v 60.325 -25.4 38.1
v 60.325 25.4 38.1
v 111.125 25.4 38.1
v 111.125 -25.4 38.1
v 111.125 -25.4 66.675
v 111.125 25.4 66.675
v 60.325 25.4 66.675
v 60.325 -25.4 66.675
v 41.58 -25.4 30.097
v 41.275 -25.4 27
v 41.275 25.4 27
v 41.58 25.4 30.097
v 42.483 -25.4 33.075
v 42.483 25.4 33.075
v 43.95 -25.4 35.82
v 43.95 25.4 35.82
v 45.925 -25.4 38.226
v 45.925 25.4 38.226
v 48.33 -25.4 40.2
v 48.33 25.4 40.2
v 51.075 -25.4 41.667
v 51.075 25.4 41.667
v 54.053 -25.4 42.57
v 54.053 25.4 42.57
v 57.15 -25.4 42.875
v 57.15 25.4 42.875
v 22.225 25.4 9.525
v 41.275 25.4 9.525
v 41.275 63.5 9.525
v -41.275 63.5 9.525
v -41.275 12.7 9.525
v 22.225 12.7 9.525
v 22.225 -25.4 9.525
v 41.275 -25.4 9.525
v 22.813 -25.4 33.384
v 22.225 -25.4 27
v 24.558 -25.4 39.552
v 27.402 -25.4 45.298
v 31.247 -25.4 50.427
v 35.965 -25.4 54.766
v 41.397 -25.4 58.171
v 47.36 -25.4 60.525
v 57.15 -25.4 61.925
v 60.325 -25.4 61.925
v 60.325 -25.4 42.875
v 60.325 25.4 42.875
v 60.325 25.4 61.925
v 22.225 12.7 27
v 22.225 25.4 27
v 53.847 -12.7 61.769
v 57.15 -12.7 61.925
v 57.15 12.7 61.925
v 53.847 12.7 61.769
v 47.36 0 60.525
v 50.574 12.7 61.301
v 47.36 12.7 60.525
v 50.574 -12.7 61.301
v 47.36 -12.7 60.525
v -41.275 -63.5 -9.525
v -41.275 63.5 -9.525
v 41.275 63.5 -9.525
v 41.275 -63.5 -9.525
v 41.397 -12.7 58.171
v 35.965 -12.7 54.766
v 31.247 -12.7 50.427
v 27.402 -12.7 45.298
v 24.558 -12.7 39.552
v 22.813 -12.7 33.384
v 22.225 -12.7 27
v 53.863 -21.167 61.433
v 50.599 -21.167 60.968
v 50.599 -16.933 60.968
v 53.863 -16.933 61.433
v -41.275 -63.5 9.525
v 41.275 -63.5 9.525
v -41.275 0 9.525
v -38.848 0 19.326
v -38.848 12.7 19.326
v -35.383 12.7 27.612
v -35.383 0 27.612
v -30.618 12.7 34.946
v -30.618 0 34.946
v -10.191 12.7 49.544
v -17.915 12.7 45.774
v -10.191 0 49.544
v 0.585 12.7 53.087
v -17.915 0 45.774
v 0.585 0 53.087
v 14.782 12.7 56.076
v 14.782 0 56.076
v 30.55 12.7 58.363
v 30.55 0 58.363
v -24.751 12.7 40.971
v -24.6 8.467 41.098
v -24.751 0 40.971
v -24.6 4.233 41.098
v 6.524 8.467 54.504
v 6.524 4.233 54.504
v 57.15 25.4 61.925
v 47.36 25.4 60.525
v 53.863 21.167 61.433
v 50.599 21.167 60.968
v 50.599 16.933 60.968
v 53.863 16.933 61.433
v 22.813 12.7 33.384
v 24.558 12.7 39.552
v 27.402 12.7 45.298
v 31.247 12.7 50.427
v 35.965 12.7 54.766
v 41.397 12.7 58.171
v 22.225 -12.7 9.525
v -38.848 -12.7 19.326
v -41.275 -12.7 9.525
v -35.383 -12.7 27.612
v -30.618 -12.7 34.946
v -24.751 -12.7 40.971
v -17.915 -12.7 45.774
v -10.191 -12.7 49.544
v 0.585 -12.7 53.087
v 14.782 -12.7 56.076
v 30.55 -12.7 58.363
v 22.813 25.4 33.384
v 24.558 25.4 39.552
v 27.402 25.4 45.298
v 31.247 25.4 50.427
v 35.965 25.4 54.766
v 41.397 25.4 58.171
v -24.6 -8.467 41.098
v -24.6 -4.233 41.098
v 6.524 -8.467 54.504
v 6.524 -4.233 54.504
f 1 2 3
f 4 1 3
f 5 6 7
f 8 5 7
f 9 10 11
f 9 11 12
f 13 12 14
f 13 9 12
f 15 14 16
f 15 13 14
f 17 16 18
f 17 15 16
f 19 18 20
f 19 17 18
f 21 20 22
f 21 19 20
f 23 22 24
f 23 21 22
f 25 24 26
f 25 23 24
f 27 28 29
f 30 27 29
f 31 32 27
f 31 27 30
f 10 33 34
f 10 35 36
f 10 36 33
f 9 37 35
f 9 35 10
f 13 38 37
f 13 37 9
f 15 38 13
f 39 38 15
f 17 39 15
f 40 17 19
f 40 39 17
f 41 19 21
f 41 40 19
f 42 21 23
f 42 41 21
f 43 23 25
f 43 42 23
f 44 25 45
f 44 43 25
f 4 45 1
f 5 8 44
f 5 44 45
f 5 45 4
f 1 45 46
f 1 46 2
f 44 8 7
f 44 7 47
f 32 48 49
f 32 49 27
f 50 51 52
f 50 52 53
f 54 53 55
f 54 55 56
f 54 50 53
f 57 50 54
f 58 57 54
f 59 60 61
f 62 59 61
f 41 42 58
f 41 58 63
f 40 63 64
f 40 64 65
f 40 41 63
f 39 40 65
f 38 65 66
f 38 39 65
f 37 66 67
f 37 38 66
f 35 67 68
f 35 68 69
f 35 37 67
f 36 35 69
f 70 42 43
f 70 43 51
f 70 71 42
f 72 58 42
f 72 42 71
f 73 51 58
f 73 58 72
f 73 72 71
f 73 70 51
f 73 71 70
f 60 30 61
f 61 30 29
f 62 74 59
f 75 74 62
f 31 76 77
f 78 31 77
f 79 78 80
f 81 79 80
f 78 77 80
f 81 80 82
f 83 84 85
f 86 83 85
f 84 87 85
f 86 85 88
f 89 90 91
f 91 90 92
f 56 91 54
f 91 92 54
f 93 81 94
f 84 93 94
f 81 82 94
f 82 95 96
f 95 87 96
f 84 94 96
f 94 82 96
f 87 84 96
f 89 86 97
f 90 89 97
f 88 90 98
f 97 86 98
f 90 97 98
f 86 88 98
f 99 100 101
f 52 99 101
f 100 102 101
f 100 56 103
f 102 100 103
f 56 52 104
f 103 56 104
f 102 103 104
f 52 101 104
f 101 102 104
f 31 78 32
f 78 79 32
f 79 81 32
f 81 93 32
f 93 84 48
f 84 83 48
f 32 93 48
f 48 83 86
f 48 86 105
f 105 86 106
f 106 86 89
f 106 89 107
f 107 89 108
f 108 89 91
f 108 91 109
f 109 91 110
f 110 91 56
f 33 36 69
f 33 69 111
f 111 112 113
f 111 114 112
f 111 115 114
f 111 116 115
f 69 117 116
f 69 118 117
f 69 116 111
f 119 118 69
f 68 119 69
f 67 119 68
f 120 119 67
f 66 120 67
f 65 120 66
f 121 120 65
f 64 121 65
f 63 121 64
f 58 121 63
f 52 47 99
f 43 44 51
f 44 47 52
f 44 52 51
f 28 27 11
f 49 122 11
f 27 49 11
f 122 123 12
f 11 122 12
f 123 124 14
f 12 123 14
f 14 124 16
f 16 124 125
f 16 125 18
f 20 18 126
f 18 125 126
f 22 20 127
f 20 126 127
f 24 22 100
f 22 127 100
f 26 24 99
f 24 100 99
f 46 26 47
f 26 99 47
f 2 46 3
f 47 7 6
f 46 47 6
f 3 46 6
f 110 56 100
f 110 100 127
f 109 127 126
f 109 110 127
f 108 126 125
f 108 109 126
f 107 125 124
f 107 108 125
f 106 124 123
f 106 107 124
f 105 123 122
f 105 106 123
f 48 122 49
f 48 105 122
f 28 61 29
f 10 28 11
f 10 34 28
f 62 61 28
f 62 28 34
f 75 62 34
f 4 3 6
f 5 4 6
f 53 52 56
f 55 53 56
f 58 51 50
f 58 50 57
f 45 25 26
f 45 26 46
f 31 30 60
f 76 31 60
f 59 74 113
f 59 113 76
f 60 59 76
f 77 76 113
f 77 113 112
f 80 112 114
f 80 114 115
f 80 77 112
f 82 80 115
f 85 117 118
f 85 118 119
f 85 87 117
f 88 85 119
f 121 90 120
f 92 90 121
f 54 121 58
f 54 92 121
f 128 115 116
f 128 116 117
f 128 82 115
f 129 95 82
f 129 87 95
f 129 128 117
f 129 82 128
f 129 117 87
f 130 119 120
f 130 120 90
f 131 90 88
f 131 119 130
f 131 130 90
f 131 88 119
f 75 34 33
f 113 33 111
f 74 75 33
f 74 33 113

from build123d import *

# Parameters (mm, degrees)
F1_DEPTH = 63.5
F2_DEPTH = 25.4
F3_DEPTH = 12.7


with BuildPart() as f1:
    # F0 (on Front) → F1 (new body, symmetric)
    with BuildSketch(Plane.XZ):
        Polygon((41.275, -9.525), (41.275, 9.525), (22.225, 9.525), (-41.275, 9.525), (-41.275, -9.525), align=None)
    extrude(amount=F1_DEPTH, both=True)

    # F0 (on Front) → F2 (join, symmetric)
    with BuildSketch(Plane.XZ):
        with BuildLine():
            Line((22.225, 9.525), (41.275, 9.525))
            Line((41.275, 9.525), (41.275, 27.0002))
            ThreePointArc((41.275, 27.0002), (45.92468, 38.22552), (57.15, 42.8752))
            Line((57.15, 42.8752), (60.325, 42.8752))
            Line((60.325, 42.8752), (60.325, 61.9252))
            Line((60.325, 61.9252), (57.15, 61.9252))
            add(Edge.make_bspline(
                [(47.359648, 60.524887), (50.585981, 60.958071), (53.852213, 61.418514), (57.15, 61.9252)],
                knots=[103.904847, 103.904847, 103.904847, 103.904847, 111.504536, 111.504536, 111.504536, 111.504536], degree=3))
            ThreePointArc((47.359648, 60.524887), (29.206453, 47.950469), (22.225, 27.0002))
            Line((22.225, 27.0002), (22.225, 9.525))
        make_face()
        Polygon((60.325, 61.9252), (60.325, 42.8752), (60.325, 38.1), (111.125, 38.1), (111.125, 66.675), (60.325, 66.675), align=None)
    extrude(amount=F2_DEPTH, both=True)

    # F0 (on Front) → F3 (join, symmetric)
    with BuildSketch(Plane.XZ):
        Polygon((41.275, -9.525), (41.275, 9.525), (22.225, 9.525), (-41.275, 9.525), (-41.275, -9.525), align=None)
        with BuildLine():
            Line((22.225, 9.525), (41.275, 9.525))
            Line((41.275, 9.525), (41.275, 27.0002))
            ThreePointArc((41.275, 27.0002), (45.92468, 38.22552), (57.15, 42.8752))
            Line((57.15, 42.8752), (60.325, 42.8752))
            Line((60.325, 42.8752), (60.325, 61.9252))
            Line((60.325, 61.9252), (57.15, 61.9252))
            add(Edge.make_bspline(
                [(47.359648, 60.524887), (50.585981, 60.958071), (53.852213, 61.418514), (57.15, 61.9252)],
                knots=[103.904847, 103.904847, 103.904847, 103.904847, 111.504536, 111.504536, 111.504536, 111.504536], degree=3))
            ThreePointArc((47.359648, 60.524887), (29.206453, 47.950469), (22.225, 27.0002))
            Line((22.225, 27.0002), (22.225, 9.525))
        make_face()
        with BuildLine():
            Line((-41.275, 9.525), (22.225, 9.525))
            Line((22.225, 9.525), (22.225, 27.0002))
            ThreePointArc((22.225, 27.0002), (29.206453, 47.950469), (47.359648, 60.524887))
            add(Edge.make_bspline(
                [(-41.275, 9.525), (-33.40458, 53.775256), (3.24841, 54.602289), (47.359648, 60.524887)],
                knots=[0, 0, 0, 0, 103.904847, 103.904847, 103.904847, 103.904847], degree=3))
        make_face()
        with BuildLine():
            ThreePointArc((57.15, 61.9252), (52.205006, 61.573349), (47.359648, 60.524887))
            add(Edge.make_bspline(
                [(47.359648, 60.524887), (50.585981, 60.958071), (53.852213, 61.418514), (57.15, 61.9252)],
                knots=[103.904847, 103.904847, 103.904847, 103.904847, 111.504536, 111.504536, 111.504536, 111.504536], degree=3))
        make_face()
        Polygon((60.325, 61.9252), (60.325, 42.8752), (60.325, 38.1), (111.125, 38.1), (111.125, 66.675), (60.325, 66.675), align=None)
    extrude(amount=F3_DEPTH, both=True)


solid = f1.part
